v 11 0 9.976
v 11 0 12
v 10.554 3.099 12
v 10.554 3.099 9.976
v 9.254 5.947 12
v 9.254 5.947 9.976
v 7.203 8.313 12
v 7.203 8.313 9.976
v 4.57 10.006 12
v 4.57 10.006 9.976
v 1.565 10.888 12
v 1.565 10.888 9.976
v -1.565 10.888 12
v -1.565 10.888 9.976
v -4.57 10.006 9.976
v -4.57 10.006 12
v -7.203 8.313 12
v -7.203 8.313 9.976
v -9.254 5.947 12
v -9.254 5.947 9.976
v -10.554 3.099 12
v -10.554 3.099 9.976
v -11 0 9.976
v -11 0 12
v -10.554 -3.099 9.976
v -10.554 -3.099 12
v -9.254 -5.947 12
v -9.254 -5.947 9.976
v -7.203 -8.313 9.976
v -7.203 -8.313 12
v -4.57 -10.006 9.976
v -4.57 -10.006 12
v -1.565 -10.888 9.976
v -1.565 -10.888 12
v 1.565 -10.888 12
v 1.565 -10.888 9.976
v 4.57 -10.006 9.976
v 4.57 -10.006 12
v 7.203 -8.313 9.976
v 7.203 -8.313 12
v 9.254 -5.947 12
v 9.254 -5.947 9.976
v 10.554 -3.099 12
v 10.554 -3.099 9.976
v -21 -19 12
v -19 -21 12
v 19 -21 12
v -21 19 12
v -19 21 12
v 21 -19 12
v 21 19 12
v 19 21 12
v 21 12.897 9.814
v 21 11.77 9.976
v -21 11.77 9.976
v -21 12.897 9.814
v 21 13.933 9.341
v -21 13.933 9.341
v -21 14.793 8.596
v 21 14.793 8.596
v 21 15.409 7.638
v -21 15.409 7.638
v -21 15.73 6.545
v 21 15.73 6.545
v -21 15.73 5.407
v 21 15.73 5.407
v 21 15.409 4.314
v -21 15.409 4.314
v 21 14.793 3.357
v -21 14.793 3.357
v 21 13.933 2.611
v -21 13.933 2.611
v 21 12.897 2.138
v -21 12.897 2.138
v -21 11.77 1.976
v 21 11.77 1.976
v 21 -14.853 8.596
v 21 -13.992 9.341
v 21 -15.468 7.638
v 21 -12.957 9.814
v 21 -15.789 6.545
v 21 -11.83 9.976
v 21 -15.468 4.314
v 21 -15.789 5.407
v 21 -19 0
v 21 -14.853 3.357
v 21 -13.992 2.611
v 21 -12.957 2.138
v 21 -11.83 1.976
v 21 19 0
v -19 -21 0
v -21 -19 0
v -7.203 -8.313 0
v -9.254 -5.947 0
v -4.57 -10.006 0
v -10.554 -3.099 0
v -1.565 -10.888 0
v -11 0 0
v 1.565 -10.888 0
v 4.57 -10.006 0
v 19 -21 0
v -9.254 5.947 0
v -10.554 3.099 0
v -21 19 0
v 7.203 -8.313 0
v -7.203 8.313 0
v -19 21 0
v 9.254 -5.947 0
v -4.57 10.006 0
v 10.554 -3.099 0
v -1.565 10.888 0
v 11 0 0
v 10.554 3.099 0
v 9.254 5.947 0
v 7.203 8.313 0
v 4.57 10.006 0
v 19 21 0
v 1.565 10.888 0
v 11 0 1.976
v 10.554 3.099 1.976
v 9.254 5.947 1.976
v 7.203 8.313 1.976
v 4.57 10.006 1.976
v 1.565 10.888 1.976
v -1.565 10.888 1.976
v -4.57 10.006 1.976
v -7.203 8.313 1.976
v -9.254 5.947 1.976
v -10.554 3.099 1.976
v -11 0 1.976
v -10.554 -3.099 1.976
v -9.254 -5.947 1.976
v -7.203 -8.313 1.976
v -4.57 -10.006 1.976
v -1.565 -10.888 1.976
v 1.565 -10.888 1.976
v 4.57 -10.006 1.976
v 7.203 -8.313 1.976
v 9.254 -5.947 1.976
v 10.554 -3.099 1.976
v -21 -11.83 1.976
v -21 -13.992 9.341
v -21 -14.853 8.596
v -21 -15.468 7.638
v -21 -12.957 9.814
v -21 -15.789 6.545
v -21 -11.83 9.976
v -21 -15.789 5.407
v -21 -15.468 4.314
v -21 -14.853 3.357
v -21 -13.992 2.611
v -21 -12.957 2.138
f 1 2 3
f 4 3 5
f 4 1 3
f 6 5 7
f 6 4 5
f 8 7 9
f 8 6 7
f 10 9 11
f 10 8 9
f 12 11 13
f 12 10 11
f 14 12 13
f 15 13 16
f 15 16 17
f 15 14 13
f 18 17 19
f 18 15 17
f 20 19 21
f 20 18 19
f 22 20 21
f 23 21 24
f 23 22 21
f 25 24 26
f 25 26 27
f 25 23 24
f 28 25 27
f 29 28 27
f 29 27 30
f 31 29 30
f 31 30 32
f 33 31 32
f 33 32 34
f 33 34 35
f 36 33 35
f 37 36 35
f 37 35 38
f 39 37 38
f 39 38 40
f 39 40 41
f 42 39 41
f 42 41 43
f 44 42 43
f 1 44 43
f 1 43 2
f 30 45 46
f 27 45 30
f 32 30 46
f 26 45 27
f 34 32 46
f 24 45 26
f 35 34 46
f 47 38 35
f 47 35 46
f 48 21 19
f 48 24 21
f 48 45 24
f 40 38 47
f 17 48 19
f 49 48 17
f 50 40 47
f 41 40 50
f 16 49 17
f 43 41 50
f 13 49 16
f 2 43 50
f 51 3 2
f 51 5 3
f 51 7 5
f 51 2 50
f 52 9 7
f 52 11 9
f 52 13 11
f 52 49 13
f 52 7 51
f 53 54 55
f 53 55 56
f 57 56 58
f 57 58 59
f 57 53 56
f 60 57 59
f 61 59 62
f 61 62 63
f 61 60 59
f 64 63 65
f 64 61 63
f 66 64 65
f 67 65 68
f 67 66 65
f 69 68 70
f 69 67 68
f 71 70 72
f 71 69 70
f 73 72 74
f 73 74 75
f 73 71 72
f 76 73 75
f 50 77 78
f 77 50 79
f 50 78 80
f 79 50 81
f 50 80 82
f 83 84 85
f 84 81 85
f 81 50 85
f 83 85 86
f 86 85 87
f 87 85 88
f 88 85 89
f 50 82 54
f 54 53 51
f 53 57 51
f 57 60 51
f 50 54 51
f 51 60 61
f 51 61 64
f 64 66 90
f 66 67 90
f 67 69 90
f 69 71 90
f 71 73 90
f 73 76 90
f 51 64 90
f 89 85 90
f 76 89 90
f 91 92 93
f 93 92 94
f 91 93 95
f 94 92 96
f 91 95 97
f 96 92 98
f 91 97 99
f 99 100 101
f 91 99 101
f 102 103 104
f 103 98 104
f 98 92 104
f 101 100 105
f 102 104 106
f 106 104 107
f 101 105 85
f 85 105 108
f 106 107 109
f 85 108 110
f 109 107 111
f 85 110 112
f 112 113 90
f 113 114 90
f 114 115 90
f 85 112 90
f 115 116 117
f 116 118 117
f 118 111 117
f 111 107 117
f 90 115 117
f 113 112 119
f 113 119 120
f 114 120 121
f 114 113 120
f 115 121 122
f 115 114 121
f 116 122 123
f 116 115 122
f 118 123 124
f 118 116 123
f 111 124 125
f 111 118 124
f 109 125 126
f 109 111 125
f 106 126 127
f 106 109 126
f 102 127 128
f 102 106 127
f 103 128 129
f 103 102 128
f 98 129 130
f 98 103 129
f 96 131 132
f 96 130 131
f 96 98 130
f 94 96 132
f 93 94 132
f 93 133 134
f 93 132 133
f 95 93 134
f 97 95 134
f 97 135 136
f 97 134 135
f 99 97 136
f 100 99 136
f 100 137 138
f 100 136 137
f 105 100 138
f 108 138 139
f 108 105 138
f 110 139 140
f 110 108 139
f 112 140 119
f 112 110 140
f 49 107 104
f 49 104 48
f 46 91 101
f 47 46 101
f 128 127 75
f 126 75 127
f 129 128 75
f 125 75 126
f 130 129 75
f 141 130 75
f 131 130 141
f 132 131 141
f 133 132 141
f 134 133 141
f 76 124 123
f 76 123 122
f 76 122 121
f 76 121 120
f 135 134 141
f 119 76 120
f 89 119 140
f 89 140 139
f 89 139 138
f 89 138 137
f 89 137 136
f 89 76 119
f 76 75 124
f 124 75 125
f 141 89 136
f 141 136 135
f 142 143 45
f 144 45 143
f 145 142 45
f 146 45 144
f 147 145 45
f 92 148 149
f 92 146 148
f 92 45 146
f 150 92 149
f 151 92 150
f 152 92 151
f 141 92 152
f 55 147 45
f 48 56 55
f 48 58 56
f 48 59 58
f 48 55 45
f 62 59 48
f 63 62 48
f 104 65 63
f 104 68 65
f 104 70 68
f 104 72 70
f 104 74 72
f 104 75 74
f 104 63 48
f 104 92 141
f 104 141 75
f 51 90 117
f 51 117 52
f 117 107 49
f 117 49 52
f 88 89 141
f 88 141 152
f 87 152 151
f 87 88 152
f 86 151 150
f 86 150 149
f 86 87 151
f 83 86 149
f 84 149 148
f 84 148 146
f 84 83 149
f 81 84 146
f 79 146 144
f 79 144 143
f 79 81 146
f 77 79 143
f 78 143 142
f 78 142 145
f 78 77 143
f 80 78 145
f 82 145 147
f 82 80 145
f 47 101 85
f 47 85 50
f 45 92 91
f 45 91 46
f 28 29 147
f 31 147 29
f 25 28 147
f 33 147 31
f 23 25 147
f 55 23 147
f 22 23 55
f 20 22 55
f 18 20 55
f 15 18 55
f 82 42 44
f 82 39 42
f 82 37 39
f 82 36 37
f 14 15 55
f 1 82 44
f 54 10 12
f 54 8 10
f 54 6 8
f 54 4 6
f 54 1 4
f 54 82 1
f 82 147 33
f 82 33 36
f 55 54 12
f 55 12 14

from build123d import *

# Parameters (mm, degrees)
SCHIZZO2_W                   = 42
SCHIZZO2_H                   = 42
ESTRUSIONE_ESTRUSIONE1_DEPTH = 12
SCHIZZO3_R                   = 11
TAGLIO_ESTRUSIONE1_DEPTH     = 12
TAGLIO_ESTRUSIONE2_DEPTH     = 42
SMUSSO2_SIZE                 = 2
SMUSSO3_SIZE                 = 2
SMUSSO4_SIZE                 = 2
SMUSSO5_SIZE                 = 2


with BuildPart() as part:
    # Schizzo2 → Estrusione-Estrusione1 (new body)
    with BuildSketch(Plane.XY):
        Rectangle(SCHIZZO2_W, SCHIZZO2_H)
    extrude(amount=ESTRUSIONE_ESTRUSIONE1_DEPTH)

    # Schizzo3 → Taglio-Estrusione1 (cut)
    with BuildSketch(Plane.XY):
        Circle(SCHIZZO3_R)
    extrude(amount=TAGLIO_ESTRUSIONE1_DEPTH, mode=Mode.SUBTRACT)

    # Schizzo5 → Taglio-Estrusione2 (cut)
    with BuildSketch(Plane(origin=(21, 0, 0), x_dir=(0, 0, -1), z_dir=(1, 0, 0))):
        with BuildLine():
            Line((-1.976058117, 11.770215969), (-1.976058117, -11.829784031))
            ThreePointArc((-1.976058117, -11.829784031), (-5.976058117, -15.829784031), (-9.976058117, -11.829784031))
            Line((-9.976058117, -11.829784031), (-9.976058117, 11.770215969))
            ThreePointArc((-9.976058117, 11.770215969), (-5.976058117, 15.770215969), (-1.976058117, 11.770215969))
        make_face()
    extrude(amount=-TAGLIO_ESTRUSIONE2_DEPTH, mode=Mode.SUBTRACT)

    # Smusso2
    smusso2_edges = [part.edges().sort_by_distance(p)[0] for p in [
        (-21, 21, 6),
    ]]
    chamfer(smusso2_edges, length=SMUSSO2_SIZE)

    # Smusso3
    smusso3_edges = [part.edges().sort_by_distance(p)[0] for p in [
        (21, 21, 6),
    ]]
    chamfer(smusso3_edges, length=SMUSSO3_SIZE)

    # Smusso4
    smusso4_edges = [part.edges().sort_by_distance(p)[0] for p in [
        (21, -21, 6),
    ]]
    chamfer(smusso4_edges, length=SMUSSO4_SIZE)

    # Smusso5
    smusso5_edges = [part.edges().sort_by_distance(p)[0] for p in [
        (-21, -21, 6),
    ]]
    chamfer(smusso5_edges, length=SMUSSO5_SIZE)


solid = part.part
